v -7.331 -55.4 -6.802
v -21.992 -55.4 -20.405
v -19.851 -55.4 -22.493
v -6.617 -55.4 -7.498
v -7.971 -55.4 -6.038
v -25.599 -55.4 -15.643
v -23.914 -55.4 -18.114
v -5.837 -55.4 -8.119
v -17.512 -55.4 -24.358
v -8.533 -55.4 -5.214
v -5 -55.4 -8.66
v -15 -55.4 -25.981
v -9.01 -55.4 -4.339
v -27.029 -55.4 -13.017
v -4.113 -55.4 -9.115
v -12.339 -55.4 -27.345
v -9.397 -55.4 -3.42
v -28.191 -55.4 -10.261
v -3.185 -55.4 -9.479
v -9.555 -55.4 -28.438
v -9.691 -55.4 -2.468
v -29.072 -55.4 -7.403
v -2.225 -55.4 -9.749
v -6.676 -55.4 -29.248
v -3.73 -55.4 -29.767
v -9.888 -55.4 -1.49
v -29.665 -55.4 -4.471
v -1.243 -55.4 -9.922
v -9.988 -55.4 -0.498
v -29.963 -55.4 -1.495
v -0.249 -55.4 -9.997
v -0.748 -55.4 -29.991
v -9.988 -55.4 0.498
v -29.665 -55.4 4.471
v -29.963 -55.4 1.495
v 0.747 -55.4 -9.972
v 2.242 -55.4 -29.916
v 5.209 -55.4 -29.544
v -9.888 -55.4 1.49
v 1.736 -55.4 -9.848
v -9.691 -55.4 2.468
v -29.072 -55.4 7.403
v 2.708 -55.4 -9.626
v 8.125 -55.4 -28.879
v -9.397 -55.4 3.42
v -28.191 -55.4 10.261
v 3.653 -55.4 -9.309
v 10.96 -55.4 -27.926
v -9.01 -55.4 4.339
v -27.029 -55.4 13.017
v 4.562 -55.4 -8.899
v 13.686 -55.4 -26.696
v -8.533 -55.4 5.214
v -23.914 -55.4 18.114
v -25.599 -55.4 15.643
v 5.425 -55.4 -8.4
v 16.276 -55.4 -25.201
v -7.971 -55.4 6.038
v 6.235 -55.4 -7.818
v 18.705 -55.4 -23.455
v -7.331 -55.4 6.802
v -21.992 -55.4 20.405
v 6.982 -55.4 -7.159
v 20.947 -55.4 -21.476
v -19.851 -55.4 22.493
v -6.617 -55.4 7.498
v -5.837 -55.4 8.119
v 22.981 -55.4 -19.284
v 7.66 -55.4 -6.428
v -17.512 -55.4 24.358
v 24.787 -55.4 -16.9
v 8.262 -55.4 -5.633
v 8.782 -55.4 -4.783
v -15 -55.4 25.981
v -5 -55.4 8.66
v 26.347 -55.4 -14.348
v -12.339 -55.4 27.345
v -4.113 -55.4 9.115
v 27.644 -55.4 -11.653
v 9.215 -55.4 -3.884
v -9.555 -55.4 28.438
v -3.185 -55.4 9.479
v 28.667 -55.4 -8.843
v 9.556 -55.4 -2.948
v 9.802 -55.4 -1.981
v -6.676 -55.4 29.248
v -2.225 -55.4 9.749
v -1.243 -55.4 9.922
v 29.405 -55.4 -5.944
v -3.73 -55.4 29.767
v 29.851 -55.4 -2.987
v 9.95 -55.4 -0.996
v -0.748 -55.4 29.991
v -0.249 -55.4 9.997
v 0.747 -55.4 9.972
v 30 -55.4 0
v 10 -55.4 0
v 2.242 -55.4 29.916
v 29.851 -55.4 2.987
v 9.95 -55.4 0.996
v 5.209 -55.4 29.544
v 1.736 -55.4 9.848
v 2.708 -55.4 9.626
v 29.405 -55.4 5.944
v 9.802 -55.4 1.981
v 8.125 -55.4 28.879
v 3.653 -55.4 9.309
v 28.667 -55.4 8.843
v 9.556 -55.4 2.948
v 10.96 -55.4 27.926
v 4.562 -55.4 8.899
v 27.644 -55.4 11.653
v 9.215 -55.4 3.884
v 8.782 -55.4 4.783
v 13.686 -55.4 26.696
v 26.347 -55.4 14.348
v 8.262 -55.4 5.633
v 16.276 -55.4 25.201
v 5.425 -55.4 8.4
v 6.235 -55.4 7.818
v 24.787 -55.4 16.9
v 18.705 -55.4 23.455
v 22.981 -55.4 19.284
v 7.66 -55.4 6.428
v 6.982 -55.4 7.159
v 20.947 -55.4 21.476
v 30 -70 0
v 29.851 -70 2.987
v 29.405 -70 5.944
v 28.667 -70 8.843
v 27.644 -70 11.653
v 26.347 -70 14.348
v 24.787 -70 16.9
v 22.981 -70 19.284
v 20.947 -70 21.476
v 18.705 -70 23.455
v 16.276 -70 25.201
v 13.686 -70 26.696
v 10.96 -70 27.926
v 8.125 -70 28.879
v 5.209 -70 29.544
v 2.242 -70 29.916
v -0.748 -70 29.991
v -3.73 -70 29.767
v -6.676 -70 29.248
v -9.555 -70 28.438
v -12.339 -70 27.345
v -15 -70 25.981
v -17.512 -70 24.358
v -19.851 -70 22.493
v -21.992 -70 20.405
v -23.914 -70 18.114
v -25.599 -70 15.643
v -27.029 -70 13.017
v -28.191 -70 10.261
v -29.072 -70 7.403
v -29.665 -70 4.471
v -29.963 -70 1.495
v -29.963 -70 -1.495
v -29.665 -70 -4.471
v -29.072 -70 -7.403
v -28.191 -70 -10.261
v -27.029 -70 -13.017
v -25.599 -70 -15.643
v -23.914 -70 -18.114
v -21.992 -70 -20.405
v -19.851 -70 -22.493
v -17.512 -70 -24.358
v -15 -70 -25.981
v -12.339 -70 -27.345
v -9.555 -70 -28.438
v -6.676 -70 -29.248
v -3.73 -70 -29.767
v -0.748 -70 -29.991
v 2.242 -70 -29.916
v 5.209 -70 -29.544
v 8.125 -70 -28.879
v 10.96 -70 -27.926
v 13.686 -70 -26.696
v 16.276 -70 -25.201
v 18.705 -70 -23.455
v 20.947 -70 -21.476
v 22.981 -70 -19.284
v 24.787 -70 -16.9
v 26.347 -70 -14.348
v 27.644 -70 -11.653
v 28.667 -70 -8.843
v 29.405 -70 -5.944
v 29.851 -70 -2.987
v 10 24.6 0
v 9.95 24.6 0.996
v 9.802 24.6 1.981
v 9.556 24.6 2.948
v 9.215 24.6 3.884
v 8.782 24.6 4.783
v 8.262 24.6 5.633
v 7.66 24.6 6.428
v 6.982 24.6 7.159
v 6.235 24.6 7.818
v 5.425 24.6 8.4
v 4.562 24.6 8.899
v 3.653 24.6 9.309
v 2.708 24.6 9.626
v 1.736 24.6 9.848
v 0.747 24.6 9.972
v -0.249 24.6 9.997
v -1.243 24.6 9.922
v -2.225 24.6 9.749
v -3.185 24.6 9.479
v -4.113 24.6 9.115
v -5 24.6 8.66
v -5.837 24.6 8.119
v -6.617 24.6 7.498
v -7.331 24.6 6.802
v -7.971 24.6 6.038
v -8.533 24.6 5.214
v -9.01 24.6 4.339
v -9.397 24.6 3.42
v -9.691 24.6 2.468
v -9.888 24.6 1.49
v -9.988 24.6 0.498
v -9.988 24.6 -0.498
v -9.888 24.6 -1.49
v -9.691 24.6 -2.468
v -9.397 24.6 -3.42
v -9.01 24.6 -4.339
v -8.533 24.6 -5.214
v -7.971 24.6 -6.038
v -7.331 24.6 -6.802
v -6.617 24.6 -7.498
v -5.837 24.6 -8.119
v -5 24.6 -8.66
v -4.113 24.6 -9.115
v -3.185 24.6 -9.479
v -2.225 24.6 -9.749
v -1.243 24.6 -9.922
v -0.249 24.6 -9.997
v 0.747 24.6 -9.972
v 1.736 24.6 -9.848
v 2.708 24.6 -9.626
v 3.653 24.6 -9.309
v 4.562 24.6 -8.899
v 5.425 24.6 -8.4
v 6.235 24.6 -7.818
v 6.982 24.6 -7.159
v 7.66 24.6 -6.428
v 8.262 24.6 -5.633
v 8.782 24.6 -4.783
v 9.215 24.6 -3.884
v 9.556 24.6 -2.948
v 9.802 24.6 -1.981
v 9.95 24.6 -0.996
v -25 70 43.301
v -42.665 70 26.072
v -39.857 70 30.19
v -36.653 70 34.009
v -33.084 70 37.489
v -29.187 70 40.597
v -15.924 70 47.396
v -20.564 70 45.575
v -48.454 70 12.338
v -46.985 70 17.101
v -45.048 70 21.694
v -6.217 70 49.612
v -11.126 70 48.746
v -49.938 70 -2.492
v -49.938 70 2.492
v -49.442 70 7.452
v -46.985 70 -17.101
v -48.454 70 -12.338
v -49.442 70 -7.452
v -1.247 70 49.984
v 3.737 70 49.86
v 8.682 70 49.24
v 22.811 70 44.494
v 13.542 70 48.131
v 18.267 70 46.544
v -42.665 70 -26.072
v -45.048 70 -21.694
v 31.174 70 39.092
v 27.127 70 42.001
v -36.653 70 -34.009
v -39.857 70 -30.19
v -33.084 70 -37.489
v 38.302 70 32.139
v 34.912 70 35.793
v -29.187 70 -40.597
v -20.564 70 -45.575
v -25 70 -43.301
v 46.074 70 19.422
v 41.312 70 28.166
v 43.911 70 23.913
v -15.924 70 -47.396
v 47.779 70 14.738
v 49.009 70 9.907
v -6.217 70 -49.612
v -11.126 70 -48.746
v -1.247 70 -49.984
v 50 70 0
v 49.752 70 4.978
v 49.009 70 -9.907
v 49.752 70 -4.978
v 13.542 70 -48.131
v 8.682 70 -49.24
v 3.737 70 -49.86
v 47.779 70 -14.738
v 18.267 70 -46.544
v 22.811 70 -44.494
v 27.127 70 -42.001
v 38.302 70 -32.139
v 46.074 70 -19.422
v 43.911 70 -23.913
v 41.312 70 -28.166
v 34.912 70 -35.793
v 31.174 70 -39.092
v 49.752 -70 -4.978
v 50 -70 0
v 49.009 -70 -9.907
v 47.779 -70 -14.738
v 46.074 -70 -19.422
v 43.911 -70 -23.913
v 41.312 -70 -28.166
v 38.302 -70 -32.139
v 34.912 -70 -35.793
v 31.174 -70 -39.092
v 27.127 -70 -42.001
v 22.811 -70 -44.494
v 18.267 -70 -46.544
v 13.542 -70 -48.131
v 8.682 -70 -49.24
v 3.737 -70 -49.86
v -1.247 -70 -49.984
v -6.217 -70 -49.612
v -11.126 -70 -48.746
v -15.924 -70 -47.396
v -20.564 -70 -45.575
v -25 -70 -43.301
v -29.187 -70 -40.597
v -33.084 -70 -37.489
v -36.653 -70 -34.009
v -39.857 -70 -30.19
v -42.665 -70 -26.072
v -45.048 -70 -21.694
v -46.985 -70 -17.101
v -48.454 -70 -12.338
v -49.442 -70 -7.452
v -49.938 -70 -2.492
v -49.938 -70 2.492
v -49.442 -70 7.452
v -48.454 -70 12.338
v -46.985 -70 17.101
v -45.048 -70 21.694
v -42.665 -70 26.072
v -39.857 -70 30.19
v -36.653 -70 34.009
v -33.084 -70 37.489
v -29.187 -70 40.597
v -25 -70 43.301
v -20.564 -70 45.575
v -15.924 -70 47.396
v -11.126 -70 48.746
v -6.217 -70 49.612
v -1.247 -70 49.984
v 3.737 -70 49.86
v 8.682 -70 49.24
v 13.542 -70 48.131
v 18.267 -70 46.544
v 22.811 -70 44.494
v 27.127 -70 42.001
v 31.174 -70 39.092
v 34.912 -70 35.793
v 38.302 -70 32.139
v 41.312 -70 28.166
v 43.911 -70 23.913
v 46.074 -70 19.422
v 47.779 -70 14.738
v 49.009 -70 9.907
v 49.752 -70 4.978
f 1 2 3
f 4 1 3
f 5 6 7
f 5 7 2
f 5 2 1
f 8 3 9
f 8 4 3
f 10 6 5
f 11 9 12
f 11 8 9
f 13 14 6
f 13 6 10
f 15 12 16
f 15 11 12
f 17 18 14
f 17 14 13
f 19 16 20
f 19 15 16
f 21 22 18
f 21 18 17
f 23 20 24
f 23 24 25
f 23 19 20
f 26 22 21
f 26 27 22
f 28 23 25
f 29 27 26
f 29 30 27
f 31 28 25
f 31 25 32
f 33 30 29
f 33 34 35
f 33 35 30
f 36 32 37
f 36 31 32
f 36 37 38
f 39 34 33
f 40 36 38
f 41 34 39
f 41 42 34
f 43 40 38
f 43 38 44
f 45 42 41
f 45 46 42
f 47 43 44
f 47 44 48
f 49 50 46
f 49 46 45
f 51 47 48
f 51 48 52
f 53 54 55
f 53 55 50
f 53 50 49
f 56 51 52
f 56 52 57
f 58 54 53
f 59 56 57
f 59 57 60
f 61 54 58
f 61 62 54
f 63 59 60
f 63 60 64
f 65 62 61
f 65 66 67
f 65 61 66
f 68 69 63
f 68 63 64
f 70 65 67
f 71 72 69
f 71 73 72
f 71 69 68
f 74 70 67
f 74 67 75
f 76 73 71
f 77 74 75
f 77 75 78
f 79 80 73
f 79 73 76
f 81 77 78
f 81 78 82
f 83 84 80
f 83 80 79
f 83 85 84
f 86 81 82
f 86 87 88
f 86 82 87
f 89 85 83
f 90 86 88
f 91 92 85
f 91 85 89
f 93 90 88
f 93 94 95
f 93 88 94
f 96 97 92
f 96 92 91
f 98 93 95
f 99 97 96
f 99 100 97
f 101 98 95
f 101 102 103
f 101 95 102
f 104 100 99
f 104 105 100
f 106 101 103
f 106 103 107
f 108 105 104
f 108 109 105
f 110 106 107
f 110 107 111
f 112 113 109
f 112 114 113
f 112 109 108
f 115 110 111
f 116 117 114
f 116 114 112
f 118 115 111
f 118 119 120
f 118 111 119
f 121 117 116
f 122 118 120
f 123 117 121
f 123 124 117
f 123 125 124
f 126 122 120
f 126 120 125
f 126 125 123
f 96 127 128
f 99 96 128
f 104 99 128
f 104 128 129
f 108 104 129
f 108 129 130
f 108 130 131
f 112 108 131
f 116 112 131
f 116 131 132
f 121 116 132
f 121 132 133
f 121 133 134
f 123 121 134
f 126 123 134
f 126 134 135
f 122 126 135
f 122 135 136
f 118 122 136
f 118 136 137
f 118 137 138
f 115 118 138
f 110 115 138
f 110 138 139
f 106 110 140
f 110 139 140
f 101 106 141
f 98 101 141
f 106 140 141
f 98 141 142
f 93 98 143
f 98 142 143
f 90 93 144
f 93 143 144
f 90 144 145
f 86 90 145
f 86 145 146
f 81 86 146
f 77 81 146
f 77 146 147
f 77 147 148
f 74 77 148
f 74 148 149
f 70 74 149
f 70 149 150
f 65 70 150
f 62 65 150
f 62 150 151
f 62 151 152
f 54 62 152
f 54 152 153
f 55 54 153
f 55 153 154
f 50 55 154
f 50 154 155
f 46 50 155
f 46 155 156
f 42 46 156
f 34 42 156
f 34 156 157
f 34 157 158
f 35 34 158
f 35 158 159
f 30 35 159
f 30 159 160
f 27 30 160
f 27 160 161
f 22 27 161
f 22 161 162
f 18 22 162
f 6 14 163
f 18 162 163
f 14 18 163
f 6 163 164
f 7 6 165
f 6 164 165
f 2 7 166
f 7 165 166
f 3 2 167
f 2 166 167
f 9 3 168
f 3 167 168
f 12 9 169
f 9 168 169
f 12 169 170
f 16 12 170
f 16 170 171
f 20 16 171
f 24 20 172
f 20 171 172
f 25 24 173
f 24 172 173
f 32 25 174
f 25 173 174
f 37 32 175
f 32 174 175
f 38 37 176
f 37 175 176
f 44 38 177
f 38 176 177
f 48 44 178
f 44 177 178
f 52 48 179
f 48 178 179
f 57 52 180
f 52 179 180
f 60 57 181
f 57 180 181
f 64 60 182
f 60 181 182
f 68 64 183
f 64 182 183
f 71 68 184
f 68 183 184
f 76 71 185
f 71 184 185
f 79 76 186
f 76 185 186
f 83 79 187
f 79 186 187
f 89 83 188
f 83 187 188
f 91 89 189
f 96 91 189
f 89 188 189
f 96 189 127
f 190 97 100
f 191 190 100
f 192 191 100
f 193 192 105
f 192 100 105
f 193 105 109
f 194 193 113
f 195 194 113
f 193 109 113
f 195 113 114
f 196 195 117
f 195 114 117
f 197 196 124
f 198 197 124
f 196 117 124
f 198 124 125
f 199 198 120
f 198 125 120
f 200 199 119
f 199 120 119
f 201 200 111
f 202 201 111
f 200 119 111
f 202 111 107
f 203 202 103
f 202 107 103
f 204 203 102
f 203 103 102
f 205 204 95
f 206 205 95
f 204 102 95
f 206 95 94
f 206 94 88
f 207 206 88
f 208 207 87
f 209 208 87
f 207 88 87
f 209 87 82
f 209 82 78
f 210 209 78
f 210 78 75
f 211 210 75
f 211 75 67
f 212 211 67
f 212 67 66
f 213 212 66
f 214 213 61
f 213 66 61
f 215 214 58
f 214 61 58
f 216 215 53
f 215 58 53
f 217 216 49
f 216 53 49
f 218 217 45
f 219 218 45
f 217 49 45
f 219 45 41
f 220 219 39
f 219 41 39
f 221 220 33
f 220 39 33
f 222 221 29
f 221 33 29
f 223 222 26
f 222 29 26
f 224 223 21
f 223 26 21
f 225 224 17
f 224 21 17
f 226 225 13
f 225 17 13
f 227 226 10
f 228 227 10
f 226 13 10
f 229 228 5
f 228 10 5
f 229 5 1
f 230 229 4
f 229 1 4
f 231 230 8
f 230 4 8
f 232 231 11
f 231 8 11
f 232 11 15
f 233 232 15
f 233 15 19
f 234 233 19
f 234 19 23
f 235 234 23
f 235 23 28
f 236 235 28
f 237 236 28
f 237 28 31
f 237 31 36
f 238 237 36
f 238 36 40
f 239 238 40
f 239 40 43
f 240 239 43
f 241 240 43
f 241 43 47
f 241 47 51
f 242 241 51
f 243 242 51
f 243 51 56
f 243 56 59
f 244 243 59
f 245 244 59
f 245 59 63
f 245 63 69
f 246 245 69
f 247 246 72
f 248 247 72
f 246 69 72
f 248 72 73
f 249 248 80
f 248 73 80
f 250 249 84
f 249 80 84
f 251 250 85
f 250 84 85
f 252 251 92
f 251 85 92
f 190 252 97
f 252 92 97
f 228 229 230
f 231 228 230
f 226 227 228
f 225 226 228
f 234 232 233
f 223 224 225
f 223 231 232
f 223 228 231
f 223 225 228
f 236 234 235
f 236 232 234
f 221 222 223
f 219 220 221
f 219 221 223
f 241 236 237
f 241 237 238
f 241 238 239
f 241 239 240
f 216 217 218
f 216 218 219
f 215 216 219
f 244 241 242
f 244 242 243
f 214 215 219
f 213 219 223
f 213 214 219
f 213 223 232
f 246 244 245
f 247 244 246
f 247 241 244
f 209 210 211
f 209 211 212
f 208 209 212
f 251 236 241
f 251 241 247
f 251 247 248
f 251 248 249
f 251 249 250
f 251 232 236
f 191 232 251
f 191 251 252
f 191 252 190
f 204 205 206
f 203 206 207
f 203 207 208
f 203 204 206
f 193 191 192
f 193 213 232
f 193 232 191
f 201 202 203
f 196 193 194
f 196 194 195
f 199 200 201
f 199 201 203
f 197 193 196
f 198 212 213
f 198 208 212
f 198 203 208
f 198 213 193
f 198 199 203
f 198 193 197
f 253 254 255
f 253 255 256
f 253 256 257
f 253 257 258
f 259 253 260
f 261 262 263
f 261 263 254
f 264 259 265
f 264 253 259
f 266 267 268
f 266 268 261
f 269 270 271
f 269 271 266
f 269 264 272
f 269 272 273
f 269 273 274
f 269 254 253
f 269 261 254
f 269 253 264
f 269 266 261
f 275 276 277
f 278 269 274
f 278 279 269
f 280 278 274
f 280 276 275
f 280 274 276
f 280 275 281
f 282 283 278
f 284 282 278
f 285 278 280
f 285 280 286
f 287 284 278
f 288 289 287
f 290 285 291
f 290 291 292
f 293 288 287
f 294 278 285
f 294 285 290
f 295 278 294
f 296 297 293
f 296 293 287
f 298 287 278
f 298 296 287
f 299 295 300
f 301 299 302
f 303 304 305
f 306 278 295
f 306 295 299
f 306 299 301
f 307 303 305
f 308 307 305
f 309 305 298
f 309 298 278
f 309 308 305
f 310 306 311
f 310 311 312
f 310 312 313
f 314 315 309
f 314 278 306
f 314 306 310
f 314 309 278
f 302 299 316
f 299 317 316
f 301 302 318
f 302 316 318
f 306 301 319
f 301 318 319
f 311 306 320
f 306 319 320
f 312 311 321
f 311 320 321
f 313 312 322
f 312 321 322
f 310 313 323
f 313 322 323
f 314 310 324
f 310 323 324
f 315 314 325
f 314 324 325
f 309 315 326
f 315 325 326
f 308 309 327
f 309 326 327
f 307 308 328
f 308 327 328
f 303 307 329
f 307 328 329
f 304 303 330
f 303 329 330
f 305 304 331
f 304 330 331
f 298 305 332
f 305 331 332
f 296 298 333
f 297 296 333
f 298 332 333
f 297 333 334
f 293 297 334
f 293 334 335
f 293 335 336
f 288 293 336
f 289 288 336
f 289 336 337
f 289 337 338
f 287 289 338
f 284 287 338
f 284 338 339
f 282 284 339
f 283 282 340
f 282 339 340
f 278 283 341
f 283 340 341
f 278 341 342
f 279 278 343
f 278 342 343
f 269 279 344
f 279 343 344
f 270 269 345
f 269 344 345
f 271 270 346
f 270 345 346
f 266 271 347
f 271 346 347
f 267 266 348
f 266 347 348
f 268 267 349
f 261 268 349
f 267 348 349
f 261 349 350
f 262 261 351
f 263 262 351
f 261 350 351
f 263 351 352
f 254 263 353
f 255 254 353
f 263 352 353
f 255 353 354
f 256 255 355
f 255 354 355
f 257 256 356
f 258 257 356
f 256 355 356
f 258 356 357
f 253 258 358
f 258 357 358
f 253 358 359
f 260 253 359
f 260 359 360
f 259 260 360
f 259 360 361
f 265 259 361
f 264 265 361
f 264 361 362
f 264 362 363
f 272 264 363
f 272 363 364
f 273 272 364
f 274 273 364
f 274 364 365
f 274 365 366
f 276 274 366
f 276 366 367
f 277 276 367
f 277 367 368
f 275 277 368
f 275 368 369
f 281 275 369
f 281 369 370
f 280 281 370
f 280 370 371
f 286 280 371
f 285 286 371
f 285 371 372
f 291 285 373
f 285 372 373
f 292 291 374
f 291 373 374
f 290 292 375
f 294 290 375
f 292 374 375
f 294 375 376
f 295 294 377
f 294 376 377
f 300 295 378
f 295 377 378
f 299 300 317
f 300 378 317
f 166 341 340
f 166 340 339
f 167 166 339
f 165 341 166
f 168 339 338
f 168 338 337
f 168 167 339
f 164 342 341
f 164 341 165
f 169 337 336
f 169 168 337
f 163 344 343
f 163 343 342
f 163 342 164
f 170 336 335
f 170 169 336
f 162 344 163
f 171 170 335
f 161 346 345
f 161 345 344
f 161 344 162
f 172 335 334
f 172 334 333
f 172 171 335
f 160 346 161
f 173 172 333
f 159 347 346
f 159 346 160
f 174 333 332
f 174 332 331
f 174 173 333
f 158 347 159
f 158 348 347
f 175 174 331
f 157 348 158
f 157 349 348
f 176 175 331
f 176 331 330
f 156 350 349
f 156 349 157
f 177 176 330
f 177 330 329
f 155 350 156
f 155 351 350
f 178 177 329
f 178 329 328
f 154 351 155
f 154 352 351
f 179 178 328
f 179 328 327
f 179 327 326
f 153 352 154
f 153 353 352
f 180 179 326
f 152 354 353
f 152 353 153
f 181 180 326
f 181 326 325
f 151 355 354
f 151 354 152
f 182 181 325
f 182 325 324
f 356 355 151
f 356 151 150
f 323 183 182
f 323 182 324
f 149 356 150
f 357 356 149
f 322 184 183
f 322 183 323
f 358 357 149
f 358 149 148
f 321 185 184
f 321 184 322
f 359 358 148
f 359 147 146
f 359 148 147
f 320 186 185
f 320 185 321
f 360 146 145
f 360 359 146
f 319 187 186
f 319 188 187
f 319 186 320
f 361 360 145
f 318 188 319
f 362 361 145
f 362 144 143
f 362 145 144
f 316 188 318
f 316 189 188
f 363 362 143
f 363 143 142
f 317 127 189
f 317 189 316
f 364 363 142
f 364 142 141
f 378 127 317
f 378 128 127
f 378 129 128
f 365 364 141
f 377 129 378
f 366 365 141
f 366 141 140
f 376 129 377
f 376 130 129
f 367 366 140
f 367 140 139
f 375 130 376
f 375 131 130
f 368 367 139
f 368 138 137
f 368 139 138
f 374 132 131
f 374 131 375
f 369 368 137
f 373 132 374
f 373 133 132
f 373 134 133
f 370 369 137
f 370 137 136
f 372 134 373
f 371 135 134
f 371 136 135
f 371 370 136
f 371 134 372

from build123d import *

# Parameters (mm, degrees)
F0_R      = 50
F1_DEPTH  = 70
F1_FACE_R = 50
F2_DEPTH  = 70
F3_R      = 30
F4_DEPTH  = 40
F5_R      = 30
F6_DEPTH  = 25.4
F7_R      = 10
F8_DEPTH  = 80


with BuildPart() as f1:
    # F0 (on Front) → F1 (new body)
    with BuildSketch(Plane.XZ):
        Circle(F0_R)
    extrude(amount=F1_DEPTH)

    # F1_face (on face) → F2 (join)
    with BuildSketch(Plane(origin=(0, 0, 0), x_dir=(1, 0, 0), z_dir=(0, 1, 0))):
        Circle(F1_FACE_R)
    extrude(amount=F2_DEPTH)

    # F3 (on face) → F4 (cut)
    with BuildSketch(Plane.XZ.offset(70)):
        Circle(F3_R)
    extrude(amount=-F4_DEPTH, mode=Mode.SUBTRACT)

    # F5 (on face) → F6 (join)
    with BuildSketch(Plane.XZ.offset(30)):
        Circle(F5_R)
    extrude(amount=F6_DEPTH)

    # F7 (on face) → F8 (cut)
    with BuildSketch(Plane.XZ.offset(55.4)):
        Circle(F7_R)
    extrude(amount=-F8_DEPTH, mode=Mode.SUBTRACT)


solid = f1.part
